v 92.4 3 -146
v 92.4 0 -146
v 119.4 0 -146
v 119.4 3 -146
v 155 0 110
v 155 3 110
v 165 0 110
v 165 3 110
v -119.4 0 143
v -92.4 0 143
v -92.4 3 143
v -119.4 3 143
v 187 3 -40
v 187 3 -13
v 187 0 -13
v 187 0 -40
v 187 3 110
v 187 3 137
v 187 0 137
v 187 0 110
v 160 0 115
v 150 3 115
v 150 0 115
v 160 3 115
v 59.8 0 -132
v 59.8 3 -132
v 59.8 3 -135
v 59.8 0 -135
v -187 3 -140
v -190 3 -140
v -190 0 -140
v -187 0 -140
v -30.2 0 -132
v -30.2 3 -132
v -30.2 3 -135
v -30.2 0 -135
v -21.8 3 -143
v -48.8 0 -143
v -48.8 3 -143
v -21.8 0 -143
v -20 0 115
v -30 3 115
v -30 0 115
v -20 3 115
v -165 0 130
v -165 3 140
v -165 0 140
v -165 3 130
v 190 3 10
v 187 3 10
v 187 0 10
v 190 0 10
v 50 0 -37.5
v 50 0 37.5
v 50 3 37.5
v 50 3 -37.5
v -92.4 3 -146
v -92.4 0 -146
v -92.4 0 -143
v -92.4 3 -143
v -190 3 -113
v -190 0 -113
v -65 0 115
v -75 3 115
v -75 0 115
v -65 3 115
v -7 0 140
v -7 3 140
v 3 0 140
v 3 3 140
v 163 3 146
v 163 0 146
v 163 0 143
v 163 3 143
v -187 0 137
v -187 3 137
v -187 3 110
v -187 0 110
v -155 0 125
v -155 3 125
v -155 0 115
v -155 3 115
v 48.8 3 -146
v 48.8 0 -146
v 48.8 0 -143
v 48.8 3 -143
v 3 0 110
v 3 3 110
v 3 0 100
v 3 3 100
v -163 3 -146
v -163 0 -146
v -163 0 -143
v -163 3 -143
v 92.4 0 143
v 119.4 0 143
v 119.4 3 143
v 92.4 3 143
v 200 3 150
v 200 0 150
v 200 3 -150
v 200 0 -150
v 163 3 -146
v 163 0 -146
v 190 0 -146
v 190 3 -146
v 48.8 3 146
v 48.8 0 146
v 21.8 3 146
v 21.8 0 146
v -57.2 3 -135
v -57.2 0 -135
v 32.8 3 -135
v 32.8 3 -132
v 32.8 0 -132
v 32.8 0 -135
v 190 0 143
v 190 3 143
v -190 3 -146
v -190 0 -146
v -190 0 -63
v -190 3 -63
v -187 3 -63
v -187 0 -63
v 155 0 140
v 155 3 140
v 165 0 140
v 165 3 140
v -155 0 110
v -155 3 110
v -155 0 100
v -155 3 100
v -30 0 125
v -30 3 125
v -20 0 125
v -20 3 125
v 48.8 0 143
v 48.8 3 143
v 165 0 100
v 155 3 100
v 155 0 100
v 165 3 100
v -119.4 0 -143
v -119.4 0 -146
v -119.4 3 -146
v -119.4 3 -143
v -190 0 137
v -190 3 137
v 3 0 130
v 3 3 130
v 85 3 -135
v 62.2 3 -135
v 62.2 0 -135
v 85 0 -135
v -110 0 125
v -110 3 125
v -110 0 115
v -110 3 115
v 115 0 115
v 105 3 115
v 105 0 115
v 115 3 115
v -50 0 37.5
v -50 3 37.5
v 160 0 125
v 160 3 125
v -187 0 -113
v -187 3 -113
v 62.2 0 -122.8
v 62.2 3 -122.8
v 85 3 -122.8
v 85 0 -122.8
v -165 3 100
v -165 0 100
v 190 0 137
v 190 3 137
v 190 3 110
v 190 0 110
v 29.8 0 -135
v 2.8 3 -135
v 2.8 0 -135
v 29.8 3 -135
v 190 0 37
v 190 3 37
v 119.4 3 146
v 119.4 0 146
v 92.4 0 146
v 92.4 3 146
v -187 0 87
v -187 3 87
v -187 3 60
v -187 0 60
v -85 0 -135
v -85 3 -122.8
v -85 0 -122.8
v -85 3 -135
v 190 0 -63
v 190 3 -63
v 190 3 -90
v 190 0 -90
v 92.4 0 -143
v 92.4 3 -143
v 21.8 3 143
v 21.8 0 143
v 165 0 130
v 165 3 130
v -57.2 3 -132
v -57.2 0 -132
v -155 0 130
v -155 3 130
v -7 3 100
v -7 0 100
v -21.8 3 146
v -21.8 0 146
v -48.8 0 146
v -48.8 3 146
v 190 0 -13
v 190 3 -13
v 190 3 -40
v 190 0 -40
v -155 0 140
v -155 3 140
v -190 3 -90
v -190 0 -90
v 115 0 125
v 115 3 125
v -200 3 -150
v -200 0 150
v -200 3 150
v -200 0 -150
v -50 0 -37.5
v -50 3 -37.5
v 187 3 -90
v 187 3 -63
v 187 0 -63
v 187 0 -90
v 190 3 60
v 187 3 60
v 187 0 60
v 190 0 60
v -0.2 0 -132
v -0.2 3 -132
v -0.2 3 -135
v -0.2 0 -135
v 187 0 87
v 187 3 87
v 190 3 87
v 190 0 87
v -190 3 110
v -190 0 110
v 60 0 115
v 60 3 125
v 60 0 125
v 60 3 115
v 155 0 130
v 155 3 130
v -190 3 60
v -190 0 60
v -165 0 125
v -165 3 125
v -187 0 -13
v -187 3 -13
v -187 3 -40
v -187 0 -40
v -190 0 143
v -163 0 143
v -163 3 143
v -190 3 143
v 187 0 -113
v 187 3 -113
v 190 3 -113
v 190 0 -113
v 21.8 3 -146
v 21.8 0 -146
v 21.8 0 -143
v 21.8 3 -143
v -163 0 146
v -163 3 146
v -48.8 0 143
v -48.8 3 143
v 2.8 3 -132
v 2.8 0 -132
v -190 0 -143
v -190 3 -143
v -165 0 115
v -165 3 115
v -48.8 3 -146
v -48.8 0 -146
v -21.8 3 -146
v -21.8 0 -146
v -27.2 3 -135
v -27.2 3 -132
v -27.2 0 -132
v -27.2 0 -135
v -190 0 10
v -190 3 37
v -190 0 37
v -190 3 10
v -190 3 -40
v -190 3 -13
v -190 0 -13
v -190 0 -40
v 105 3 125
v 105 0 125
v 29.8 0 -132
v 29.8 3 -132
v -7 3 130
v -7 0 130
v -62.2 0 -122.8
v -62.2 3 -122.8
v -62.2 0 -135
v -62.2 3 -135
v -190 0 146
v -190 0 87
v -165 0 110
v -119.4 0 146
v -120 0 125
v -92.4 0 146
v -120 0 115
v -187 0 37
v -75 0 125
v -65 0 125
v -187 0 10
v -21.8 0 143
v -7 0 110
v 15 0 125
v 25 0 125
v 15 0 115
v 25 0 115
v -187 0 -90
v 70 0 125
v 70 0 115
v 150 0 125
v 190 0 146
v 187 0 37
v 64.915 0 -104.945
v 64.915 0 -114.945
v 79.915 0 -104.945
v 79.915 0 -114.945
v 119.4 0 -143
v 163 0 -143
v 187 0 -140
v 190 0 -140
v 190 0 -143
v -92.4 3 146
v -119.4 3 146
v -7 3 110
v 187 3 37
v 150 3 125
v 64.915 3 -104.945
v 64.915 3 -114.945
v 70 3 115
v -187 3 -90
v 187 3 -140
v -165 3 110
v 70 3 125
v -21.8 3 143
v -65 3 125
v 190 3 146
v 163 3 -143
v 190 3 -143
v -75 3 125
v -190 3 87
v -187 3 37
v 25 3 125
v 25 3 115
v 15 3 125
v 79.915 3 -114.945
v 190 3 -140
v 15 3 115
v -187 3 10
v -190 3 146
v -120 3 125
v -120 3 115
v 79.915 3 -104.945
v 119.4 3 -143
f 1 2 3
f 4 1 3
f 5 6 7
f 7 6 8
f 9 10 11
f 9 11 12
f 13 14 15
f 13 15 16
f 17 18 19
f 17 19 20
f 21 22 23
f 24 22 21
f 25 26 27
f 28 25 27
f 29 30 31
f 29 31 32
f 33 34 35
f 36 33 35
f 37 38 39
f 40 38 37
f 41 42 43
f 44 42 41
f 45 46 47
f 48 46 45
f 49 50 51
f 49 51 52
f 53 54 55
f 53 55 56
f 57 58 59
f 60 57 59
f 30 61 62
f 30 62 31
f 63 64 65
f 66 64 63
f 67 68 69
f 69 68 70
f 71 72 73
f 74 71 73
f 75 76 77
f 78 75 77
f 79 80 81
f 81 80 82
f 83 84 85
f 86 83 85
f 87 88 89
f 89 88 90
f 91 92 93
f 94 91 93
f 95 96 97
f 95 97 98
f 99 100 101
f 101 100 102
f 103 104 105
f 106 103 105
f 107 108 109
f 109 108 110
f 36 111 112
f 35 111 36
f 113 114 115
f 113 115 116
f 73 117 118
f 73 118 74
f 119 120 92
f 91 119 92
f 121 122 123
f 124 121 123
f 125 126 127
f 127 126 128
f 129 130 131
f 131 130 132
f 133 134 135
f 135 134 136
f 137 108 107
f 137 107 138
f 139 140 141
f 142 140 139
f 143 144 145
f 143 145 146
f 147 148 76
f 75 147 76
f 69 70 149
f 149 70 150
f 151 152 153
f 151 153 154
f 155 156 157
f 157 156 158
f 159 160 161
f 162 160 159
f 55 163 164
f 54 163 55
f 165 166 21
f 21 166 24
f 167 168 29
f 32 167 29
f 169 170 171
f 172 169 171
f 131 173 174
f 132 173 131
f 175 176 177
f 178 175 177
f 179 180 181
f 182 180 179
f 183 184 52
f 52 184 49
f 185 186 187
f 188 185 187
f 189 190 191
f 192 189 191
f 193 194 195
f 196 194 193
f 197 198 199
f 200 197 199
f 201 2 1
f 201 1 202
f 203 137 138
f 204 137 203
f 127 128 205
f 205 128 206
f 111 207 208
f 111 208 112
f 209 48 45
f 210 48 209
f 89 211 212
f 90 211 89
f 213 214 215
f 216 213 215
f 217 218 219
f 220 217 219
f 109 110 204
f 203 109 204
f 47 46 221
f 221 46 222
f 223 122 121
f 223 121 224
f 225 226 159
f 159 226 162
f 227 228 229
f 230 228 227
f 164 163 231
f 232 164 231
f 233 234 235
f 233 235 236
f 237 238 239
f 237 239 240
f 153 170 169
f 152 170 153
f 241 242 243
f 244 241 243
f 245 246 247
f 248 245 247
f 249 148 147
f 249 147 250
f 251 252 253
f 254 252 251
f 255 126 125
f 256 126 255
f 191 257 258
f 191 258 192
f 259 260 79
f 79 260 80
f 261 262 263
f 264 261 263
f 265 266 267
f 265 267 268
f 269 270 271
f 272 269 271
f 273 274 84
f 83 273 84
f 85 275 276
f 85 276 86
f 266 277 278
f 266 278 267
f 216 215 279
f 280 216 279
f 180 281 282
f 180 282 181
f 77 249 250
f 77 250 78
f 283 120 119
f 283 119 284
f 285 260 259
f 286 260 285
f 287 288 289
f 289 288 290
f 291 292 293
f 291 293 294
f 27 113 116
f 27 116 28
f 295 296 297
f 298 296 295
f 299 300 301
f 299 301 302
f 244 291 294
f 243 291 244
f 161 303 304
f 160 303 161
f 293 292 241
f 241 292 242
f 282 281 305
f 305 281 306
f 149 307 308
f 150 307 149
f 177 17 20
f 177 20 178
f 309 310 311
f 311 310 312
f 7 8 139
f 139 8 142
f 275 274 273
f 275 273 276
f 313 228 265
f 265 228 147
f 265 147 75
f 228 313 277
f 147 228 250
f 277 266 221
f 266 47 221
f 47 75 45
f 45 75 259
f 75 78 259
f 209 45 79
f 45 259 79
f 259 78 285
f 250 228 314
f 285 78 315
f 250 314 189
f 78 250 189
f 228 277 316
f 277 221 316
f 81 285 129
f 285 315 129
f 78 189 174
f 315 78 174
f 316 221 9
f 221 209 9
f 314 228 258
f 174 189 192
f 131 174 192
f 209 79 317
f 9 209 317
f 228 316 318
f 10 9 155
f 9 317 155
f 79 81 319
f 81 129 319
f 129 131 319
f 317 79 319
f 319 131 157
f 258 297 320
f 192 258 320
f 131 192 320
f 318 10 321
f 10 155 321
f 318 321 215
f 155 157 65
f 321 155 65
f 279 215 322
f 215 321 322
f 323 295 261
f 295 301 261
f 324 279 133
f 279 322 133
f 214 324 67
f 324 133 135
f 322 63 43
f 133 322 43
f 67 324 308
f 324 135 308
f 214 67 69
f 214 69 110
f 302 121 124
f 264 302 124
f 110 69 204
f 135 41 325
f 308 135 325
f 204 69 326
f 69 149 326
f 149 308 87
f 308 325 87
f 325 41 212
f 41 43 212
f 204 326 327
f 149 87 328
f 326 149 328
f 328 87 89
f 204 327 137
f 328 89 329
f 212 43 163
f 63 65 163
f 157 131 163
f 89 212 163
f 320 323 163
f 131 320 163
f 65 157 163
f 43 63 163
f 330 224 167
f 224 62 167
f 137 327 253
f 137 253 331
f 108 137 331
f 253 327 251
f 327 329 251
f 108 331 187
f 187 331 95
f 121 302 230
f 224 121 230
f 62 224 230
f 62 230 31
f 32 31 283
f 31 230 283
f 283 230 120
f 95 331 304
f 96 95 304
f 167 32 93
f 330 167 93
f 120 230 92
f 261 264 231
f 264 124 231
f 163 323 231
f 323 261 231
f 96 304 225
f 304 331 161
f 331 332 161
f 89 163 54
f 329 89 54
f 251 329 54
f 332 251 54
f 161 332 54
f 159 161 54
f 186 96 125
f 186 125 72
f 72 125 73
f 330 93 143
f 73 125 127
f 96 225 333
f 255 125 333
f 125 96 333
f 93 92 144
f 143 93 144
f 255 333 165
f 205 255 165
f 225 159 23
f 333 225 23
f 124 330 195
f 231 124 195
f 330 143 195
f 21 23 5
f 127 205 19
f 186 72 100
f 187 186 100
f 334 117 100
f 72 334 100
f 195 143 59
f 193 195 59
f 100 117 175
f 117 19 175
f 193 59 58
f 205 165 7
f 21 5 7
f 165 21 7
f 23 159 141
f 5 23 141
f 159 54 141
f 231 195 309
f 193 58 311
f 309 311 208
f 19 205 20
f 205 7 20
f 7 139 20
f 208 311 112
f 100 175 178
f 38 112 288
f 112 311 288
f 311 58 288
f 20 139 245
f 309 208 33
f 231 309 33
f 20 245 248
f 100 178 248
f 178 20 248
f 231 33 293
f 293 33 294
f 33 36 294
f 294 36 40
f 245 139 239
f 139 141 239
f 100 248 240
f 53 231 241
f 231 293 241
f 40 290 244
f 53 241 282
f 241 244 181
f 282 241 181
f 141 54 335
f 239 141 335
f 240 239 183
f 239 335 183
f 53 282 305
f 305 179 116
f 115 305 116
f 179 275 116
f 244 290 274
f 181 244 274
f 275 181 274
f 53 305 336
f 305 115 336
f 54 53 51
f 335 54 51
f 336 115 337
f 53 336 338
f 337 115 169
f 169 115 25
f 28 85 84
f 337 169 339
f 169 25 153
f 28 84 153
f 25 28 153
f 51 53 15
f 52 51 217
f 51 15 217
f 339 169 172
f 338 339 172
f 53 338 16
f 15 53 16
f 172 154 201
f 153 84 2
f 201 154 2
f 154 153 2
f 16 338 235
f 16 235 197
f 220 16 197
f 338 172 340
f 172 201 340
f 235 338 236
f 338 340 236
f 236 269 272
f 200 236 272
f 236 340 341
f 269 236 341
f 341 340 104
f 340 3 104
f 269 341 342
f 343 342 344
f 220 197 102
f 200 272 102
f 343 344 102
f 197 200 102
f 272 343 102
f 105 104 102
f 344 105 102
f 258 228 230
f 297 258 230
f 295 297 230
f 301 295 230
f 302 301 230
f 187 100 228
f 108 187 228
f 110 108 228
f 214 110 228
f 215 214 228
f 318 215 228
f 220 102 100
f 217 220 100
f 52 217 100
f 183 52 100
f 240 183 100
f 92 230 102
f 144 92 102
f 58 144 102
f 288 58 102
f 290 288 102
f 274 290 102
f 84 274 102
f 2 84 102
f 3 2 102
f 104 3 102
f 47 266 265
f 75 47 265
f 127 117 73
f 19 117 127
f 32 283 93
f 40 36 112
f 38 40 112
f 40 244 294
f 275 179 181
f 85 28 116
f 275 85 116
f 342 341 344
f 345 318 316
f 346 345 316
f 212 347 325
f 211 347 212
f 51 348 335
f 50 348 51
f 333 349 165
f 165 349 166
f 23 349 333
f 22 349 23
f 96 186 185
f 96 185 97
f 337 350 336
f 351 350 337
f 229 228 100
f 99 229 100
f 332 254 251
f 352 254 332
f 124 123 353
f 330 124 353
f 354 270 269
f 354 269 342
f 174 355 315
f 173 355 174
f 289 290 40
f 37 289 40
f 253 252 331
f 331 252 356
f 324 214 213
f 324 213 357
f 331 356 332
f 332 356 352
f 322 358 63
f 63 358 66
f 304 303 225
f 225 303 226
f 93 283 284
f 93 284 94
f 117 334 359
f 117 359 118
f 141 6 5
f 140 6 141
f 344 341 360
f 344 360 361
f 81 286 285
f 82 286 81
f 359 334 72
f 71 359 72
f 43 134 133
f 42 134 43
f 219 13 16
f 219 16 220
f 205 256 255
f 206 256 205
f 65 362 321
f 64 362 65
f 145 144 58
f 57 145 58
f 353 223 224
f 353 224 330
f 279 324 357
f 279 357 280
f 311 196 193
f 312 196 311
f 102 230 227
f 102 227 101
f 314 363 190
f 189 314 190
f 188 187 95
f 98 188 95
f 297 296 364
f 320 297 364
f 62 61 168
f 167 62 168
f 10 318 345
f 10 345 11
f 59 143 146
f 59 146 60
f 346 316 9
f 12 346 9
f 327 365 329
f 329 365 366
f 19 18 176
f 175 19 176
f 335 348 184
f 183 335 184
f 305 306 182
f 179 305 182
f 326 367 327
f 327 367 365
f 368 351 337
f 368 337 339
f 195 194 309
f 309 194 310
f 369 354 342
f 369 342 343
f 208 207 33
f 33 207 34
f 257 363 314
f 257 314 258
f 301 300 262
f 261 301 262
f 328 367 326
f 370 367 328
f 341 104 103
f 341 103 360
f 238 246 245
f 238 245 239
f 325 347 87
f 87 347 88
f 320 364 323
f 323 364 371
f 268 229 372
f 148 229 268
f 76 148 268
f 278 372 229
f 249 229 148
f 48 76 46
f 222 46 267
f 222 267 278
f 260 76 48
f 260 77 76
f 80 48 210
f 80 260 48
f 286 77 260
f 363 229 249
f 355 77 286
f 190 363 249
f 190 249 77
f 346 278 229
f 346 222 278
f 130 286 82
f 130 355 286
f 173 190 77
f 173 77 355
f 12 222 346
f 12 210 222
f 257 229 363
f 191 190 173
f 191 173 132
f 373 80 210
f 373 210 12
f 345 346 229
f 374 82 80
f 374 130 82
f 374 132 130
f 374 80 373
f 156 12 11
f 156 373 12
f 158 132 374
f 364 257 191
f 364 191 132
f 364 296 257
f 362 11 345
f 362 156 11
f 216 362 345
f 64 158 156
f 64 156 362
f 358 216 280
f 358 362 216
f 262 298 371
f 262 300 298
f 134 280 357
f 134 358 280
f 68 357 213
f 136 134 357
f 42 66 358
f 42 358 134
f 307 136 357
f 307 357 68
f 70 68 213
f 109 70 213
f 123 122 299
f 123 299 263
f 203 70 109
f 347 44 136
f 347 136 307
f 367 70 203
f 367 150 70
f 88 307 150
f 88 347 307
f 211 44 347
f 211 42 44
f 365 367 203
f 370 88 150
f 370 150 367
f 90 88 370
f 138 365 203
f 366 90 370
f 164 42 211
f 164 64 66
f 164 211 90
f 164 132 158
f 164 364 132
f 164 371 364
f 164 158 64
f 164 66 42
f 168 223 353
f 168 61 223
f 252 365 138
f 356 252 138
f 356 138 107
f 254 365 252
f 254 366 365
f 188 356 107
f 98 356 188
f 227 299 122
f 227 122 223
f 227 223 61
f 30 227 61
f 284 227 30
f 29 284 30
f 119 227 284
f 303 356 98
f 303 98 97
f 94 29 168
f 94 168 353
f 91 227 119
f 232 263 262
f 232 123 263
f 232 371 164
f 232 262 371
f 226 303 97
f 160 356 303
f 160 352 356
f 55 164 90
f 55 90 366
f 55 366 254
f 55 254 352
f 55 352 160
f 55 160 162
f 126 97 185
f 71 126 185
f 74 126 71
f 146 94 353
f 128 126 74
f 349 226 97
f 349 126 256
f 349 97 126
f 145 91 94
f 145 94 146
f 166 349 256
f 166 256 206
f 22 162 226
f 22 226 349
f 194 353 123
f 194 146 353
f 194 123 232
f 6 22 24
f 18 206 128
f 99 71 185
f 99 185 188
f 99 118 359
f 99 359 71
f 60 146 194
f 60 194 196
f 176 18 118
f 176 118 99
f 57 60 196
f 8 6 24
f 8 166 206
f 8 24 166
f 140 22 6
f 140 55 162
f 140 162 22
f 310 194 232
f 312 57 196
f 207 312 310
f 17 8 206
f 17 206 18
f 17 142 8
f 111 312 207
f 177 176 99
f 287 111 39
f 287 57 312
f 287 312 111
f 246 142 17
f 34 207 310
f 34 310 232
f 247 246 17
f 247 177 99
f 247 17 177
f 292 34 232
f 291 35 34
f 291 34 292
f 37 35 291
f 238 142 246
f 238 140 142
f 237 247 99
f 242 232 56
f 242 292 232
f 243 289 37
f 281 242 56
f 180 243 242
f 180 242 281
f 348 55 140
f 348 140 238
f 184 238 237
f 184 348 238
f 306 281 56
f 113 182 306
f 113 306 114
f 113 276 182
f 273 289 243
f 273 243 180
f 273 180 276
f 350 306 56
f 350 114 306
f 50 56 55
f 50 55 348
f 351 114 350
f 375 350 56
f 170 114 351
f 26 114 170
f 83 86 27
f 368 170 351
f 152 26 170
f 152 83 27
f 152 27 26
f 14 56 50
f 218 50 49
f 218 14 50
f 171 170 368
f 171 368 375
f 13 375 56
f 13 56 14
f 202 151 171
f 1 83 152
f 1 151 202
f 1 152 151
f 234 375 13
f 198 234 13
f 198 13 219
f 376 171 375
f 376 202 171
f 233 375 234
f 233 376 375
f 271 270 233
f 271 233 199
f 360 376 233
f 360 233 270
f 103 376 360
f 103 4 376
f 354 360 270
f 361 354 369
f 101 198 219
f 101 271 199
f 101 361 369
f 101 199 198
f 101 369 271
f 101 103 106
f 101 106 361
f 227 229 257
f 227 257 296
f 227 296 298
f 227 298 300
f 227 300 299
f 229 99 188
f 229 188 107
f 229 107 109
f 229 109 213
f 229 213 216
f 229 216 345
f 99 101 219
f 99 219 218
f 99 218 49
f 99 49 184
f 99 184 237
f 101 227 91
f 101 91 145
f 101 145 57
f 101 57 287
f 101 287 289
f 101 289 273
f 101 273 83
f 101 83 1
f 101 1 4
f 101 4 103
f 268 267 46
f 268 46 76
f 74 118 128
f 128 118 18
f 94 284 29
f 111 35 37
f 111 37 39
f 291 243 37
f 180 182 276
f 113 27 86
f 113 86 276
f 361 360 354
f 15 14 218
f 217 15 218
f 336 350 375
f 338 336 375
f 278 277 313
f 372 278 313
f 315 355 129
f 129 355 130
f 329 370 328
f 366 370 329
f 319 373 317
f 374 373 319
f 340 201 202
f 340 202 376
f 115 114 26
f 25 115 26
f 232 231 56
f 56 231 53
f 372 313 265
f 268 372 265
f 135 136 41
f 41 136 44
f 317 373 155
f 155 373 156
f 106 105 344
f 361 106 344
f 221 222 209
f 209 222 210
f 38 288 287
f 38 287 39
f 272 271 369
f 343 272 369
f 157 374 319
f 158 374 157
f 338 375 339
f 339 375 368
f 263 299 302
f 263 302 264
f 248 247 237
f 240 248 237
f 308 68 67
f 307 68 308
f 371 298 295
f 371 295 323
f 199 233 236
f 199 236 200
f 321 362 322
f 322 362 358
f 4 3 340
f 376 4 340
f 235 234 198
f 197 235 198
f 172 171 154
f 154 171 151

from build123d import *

# Parameters (mm, degrees)
SKETCH1_W           = 400
SKETCH1_H           = 300
SKETCH1_W_2         = 100
SKETCH1_H_2         = 75
BOSS_EXTRUDE2_DEPTH = 3
SKETCH2_W           = 10
SKETCH2_H           = 10
CUT_EXTRUDE1_DEPTH  = 3
SKETCH3_W           = 22.8
SKETCH3_H           = 12.2
CUT_EXTRUDE2_DEPTH  = 3
SKETCH4_W           = 15
SKETCH4_H           = 10
CUT_EXTRUDE3_DEPTH  = 3
SKETCH5_W           = 3
SKETCH5_H           = 27
CUT_EXTRUDE4_DEPTH  = 3
SKETCH6_W           = 3
SKETCH6_H           = 27
CUT_EXTRUDE5_DEPTH  = 3
SKETCH7_W           = 27
SKETCH7_H           = 3
CUT_EXTRUDE6_DEPTH  = 3
SKETCH8_W           = 10
SKETCH8_H           = 10
CUT_EXTRUDE7_DEPTH  = 3
SKETCH9_W           = 10
SKETCH9_H           = 10
CUT_EXTRUDE8_DEPTH  = 3
SKETCH11_W          = 10
SKETCH11_H          = 10
CUT_EXTRUDE9_DEPTH  = 3
SKETCH12_W          = 27
SKETCH12_H          = 3
CUT_EXTRUDE10_DEPTH = 10
SKETCH13_W          = 27
SKETCH13_H          = 3
CUT_EXTRUDE11_DEPTH = 10


with BuildPart() as part:
    # Sketch1 → Boss-Extrude2 (new body)
    with BuildSketch(Plane(origin=(0, 0, 0), x_dir=(1, 0, 0), z_dir=(0, 1, 0))):
        Rectangle(SKETCH1_W, SKETCH1_H)
        Rectangle(SKETCH1_W_2, SKETCH1_H_2, mode=Mode.SUBTRACT)
    extrude(amount=BOSS_EXTRUDE2_DEPTH)

    # Sketch2 → Cut-Extrude1 (cut)
    with BuildSketch(Plane(origin=(0, 3, 0), x_dir=(1, 0, 0), z_dir=(0, 1, 0))):
        with Locations((-160, -120)):
            Rectangle(SKETCH2_W, SKETCH2_H)
        with Locations((-115, -120)):
            Rectangle(SKETCH2_W, SKETCH2_H)
        with Locations((-70, -120)):
            Rectangle(SKETCH2_W, SKETCH2_H)
        with Locations((-25, -120)):
            Rectangle(SKETCH2_W, SKETCH2_H)
        with Locations((20, -120)):
            Rectangle(SKETCH2_W, SKETCH2_H)
        with Locations((65, -120)):
            Rectangle(SKETCH2_W, SKETCH2_H)
        with Locations((110, -120)):
            Rectangle(SKETCH2_W, SKETCH2_H)
        with Locations((155, -120)):
            Rectangle(SKETCH2_W, SKETCH2_H)
    extrude(amount=-CUT_EXTRUDE1_DEPTH, mode=Mode.SUBTRACT)

    # Sketch3 → Cut-Extrude2 (cut)
    with BuildSketch(Plane(origin=(0, 3, 0), x_dir=(1, 0, 0), z_dir=(0, 1, 0))):
        with Locations((-73.6, 128.9)):
            Rectangle(SKETCH3_W, SKETCH3_H)
        with Locations((73.6, 128.9)):
            Rectangle(SKETCH3_W, SKETCH3_H)
    extrude(amount=-CUT_EXTRUDE2_DEPTH, mode=Mode.SUBTRACT)

    # Sketch4 → Cut-Extrude3 (cut)
    with BuildSketch(Plane(origin=(0, 3, 0), x_dir=(1, 0, 0), z_dir=(0, 1, 0))):
        with Locations((72.41501841, 109.945064446)):
            Rectangle(SKETCH4_W, SKETCH4_H)
    extrude(amount=-CUT_EXTRUDE3_DEPTH, mode=Mode.SUBTRACT)

    # Sketch5 → Cut-Extrude4 (cut)
    with BuildSketch(Plane(origin=(0, 3, 0), x_dir=(1, 0, 0), z_dir=(0, 1, 0))):
        with Locations((-188.5, 126.5)):
            Rectangle(SKETCH5_W, SKETCH5_H)
        with Locations((-188.5, 76.5)):
            Rectangle(SKETCH5_W, SKETCH5_H)
        with Locations((-188.5, 26.5)):
            Rectangle(SKETCH5_W, SKETCH5_H)
        with Locations((-188.5, -23.5)):
            Rectangle(SKETCH5_W, SKETCH5_H)
        with Locations((-188.5, -73.5)):
            Rectangle(SKETCH5_W, SKETCH5_H)
        with Locations((-188.5, -123.5)):
            Rectangle(SKETCH5_W, SKETCH5_H)
    extrude(amount=-CUT_EXTRUDE4_DEPTH, mode=Mode.SUBTRACT)

    # Sketch6 → Cut-Extrude5 (cut)
    with BuildSketch(Plane(origin=(0, 3, 0), x_dir=(1, 0, 0), z_dir=(0, 1, 0))):
        with Locations((188.5, 126.5)):
            Rectangle(SKETCH6_W, SKETCH6_H)
        with Locations((188.5, 76.5)):
            Rectangle(SKETCH6_W, SKETCH6_H)
        with Locations((188.5, 26.5)):
            Rectangle(SKETCH6_W, SKETCH6_H)
        with Locations((188.5, -23.5)):
            Rectangle(SKETCH6_W, SKETCH6_H)
        with Locations((188.5, -73.5)):
            Rectangle(SKETCH6_W, SKETCH6_H)
        with Locations((188.5, -123.5)):
            Rectangle(SKETCH6_W, SKETCH6_H)
    extrude(amount=-CUT_EXTRUDE5_DEPTH, mode=Mode.SUBTRACT)

    # Sketch7 → Cut-Extrude6 (cut)
    with BuildSketch(Plane(origin=(0, 3, 0), x_dir=(1, 0, 0), z_dir=(0, 1, 0))):
        with Locations((-43.7, 133.5)):
            Rectangle(SKETCH7_W, SKETCH7_H)
        with Locations((-13.7, 133.5)):
            Rectangle(SKETCH7_W, SKETCH7_H)
        with Locations((16.3, 133.5)):
            Rectangle(SKETCH7_W, SKETCH7_H)
        with Locations((46.3, 133.5)):
            Rectangle(SKETCH7_W, SKETCH7_H)
    extrude(amount=-CUT_EXTRUDE6_DEPTH, mode=Mode.SUBTRACT)

    # Sketch8 → Cut-Extrude7 (cut)
    with BuildSketch(Plane(origin=(0, 3, 0), x_dir=(1, 0, 0), z_dir=(0, 1, 0))):
        with Locations((-160, -135)):
            Rectangle(SKETCH8_W, SKETCH8_H)
        with Locations((-160, -105)):
            Rectangle(SKETCH8_W, SKETCH8_H)
    extrude(amount=-CUT_EXTRUDE7_DEPTH, mode=Mode.SUBTRACT)

    # Sketch9 → Cut-Extrude8 (cut)
    with BuildSketch(Plane(origin=(0, 3, 0), x_dir=(1, 0, 0), z_dir=(0, 1, 0))):
        with Locations((-2, -135)):
            Rectangle(SKETCH9_W, SKETCH9_H)
        with Locations((-2, -105)):
            Rectangle(SKETCH9_W, SKETCH9_H)
    extrude(amount=-CUT_EXTRUDE8_DEPTH, mode=Mode.SUBTRACT)

    # Sketch11 → Cut-Extrude9 (cut)
    with BuildSketch(Plane(origin=(0, 3, 0), x_dir=(1, 0, 0), z_dir=(0, 1, 0))):
        with Locations((160, -135)):
            Rectangle(SKETCH11_W, SKETCH11_H)
        with Locations((160, -105)):
            Rectangle(SKETCH11_W, SKETCH11_H)
    extrude(amount=-CUT_EXTRUDE9_DEPTH, mode=Mode.SUBTRACT)

    # Sketch12 → Cut-Extrude10 (cut)
    with BuildSketch(Plane.XZ):
        with Locations((-176.5, -144.5)):
            Rectangle(SKETCH12_W, SKETCH12_H)
        with Locations((-105.9, -144.5)):
            Rectangle(SKETCH12_W, SKETCH12_H)
        with Locations((-35.3, -144.5)):
            Rectangle(SKETCH12_W, SKETCH12_H)
        with Locations((35.3, -144.5)):
            Rectangle(SKETCH12_W, SKETCH12_H)
        with Locations((105.9, -144.5)):
            Rectangle(SKETCH12_W, SKETCH12_H)
        with Locations((176.5, -144.5)):
            Rectangle(SKETCH12_W, SKETCH12_H)
    extrude(amount=-CUT_EXTRUDE10_DEPTH, mode=Mode.SUBTRACT)

    # Sketch13 → Cut-Extrude11 (cut)
    with BuildSketch(Plane(origin=(0, 0, 0), x_dir=(-1, 0, 0), z_dir=(0, -1, 0))):
        with Locations((176.5, -144.5)):
            Rectangle(SKETCH13_W, SKETCH13_H)
        with Locations((105.9, -144.5)):
            Rectangle(SKETCH13_W, SKETCH13_H)
        with Locations((35.3, -144.5)):
            Rectangle(SKETCH13_W, SKETCH13_H)
        with Locations((-35.3, -144.5)):
            Rectangle(SKETCH13_W, SKETCH13_H)
        with Locations((-105.9, -144.5)):
            Rectangle(SKETCH13_W, SKETCH13_H)
        with Locations((-176.5, -144.5)):
            Rectangle(SKETCH13_W, SKETCH13_H)
    extrude(amount=-CUT_EXTRUDE11_DEPTH, mode=Mode.SUBTRACT)


solid = part.part
